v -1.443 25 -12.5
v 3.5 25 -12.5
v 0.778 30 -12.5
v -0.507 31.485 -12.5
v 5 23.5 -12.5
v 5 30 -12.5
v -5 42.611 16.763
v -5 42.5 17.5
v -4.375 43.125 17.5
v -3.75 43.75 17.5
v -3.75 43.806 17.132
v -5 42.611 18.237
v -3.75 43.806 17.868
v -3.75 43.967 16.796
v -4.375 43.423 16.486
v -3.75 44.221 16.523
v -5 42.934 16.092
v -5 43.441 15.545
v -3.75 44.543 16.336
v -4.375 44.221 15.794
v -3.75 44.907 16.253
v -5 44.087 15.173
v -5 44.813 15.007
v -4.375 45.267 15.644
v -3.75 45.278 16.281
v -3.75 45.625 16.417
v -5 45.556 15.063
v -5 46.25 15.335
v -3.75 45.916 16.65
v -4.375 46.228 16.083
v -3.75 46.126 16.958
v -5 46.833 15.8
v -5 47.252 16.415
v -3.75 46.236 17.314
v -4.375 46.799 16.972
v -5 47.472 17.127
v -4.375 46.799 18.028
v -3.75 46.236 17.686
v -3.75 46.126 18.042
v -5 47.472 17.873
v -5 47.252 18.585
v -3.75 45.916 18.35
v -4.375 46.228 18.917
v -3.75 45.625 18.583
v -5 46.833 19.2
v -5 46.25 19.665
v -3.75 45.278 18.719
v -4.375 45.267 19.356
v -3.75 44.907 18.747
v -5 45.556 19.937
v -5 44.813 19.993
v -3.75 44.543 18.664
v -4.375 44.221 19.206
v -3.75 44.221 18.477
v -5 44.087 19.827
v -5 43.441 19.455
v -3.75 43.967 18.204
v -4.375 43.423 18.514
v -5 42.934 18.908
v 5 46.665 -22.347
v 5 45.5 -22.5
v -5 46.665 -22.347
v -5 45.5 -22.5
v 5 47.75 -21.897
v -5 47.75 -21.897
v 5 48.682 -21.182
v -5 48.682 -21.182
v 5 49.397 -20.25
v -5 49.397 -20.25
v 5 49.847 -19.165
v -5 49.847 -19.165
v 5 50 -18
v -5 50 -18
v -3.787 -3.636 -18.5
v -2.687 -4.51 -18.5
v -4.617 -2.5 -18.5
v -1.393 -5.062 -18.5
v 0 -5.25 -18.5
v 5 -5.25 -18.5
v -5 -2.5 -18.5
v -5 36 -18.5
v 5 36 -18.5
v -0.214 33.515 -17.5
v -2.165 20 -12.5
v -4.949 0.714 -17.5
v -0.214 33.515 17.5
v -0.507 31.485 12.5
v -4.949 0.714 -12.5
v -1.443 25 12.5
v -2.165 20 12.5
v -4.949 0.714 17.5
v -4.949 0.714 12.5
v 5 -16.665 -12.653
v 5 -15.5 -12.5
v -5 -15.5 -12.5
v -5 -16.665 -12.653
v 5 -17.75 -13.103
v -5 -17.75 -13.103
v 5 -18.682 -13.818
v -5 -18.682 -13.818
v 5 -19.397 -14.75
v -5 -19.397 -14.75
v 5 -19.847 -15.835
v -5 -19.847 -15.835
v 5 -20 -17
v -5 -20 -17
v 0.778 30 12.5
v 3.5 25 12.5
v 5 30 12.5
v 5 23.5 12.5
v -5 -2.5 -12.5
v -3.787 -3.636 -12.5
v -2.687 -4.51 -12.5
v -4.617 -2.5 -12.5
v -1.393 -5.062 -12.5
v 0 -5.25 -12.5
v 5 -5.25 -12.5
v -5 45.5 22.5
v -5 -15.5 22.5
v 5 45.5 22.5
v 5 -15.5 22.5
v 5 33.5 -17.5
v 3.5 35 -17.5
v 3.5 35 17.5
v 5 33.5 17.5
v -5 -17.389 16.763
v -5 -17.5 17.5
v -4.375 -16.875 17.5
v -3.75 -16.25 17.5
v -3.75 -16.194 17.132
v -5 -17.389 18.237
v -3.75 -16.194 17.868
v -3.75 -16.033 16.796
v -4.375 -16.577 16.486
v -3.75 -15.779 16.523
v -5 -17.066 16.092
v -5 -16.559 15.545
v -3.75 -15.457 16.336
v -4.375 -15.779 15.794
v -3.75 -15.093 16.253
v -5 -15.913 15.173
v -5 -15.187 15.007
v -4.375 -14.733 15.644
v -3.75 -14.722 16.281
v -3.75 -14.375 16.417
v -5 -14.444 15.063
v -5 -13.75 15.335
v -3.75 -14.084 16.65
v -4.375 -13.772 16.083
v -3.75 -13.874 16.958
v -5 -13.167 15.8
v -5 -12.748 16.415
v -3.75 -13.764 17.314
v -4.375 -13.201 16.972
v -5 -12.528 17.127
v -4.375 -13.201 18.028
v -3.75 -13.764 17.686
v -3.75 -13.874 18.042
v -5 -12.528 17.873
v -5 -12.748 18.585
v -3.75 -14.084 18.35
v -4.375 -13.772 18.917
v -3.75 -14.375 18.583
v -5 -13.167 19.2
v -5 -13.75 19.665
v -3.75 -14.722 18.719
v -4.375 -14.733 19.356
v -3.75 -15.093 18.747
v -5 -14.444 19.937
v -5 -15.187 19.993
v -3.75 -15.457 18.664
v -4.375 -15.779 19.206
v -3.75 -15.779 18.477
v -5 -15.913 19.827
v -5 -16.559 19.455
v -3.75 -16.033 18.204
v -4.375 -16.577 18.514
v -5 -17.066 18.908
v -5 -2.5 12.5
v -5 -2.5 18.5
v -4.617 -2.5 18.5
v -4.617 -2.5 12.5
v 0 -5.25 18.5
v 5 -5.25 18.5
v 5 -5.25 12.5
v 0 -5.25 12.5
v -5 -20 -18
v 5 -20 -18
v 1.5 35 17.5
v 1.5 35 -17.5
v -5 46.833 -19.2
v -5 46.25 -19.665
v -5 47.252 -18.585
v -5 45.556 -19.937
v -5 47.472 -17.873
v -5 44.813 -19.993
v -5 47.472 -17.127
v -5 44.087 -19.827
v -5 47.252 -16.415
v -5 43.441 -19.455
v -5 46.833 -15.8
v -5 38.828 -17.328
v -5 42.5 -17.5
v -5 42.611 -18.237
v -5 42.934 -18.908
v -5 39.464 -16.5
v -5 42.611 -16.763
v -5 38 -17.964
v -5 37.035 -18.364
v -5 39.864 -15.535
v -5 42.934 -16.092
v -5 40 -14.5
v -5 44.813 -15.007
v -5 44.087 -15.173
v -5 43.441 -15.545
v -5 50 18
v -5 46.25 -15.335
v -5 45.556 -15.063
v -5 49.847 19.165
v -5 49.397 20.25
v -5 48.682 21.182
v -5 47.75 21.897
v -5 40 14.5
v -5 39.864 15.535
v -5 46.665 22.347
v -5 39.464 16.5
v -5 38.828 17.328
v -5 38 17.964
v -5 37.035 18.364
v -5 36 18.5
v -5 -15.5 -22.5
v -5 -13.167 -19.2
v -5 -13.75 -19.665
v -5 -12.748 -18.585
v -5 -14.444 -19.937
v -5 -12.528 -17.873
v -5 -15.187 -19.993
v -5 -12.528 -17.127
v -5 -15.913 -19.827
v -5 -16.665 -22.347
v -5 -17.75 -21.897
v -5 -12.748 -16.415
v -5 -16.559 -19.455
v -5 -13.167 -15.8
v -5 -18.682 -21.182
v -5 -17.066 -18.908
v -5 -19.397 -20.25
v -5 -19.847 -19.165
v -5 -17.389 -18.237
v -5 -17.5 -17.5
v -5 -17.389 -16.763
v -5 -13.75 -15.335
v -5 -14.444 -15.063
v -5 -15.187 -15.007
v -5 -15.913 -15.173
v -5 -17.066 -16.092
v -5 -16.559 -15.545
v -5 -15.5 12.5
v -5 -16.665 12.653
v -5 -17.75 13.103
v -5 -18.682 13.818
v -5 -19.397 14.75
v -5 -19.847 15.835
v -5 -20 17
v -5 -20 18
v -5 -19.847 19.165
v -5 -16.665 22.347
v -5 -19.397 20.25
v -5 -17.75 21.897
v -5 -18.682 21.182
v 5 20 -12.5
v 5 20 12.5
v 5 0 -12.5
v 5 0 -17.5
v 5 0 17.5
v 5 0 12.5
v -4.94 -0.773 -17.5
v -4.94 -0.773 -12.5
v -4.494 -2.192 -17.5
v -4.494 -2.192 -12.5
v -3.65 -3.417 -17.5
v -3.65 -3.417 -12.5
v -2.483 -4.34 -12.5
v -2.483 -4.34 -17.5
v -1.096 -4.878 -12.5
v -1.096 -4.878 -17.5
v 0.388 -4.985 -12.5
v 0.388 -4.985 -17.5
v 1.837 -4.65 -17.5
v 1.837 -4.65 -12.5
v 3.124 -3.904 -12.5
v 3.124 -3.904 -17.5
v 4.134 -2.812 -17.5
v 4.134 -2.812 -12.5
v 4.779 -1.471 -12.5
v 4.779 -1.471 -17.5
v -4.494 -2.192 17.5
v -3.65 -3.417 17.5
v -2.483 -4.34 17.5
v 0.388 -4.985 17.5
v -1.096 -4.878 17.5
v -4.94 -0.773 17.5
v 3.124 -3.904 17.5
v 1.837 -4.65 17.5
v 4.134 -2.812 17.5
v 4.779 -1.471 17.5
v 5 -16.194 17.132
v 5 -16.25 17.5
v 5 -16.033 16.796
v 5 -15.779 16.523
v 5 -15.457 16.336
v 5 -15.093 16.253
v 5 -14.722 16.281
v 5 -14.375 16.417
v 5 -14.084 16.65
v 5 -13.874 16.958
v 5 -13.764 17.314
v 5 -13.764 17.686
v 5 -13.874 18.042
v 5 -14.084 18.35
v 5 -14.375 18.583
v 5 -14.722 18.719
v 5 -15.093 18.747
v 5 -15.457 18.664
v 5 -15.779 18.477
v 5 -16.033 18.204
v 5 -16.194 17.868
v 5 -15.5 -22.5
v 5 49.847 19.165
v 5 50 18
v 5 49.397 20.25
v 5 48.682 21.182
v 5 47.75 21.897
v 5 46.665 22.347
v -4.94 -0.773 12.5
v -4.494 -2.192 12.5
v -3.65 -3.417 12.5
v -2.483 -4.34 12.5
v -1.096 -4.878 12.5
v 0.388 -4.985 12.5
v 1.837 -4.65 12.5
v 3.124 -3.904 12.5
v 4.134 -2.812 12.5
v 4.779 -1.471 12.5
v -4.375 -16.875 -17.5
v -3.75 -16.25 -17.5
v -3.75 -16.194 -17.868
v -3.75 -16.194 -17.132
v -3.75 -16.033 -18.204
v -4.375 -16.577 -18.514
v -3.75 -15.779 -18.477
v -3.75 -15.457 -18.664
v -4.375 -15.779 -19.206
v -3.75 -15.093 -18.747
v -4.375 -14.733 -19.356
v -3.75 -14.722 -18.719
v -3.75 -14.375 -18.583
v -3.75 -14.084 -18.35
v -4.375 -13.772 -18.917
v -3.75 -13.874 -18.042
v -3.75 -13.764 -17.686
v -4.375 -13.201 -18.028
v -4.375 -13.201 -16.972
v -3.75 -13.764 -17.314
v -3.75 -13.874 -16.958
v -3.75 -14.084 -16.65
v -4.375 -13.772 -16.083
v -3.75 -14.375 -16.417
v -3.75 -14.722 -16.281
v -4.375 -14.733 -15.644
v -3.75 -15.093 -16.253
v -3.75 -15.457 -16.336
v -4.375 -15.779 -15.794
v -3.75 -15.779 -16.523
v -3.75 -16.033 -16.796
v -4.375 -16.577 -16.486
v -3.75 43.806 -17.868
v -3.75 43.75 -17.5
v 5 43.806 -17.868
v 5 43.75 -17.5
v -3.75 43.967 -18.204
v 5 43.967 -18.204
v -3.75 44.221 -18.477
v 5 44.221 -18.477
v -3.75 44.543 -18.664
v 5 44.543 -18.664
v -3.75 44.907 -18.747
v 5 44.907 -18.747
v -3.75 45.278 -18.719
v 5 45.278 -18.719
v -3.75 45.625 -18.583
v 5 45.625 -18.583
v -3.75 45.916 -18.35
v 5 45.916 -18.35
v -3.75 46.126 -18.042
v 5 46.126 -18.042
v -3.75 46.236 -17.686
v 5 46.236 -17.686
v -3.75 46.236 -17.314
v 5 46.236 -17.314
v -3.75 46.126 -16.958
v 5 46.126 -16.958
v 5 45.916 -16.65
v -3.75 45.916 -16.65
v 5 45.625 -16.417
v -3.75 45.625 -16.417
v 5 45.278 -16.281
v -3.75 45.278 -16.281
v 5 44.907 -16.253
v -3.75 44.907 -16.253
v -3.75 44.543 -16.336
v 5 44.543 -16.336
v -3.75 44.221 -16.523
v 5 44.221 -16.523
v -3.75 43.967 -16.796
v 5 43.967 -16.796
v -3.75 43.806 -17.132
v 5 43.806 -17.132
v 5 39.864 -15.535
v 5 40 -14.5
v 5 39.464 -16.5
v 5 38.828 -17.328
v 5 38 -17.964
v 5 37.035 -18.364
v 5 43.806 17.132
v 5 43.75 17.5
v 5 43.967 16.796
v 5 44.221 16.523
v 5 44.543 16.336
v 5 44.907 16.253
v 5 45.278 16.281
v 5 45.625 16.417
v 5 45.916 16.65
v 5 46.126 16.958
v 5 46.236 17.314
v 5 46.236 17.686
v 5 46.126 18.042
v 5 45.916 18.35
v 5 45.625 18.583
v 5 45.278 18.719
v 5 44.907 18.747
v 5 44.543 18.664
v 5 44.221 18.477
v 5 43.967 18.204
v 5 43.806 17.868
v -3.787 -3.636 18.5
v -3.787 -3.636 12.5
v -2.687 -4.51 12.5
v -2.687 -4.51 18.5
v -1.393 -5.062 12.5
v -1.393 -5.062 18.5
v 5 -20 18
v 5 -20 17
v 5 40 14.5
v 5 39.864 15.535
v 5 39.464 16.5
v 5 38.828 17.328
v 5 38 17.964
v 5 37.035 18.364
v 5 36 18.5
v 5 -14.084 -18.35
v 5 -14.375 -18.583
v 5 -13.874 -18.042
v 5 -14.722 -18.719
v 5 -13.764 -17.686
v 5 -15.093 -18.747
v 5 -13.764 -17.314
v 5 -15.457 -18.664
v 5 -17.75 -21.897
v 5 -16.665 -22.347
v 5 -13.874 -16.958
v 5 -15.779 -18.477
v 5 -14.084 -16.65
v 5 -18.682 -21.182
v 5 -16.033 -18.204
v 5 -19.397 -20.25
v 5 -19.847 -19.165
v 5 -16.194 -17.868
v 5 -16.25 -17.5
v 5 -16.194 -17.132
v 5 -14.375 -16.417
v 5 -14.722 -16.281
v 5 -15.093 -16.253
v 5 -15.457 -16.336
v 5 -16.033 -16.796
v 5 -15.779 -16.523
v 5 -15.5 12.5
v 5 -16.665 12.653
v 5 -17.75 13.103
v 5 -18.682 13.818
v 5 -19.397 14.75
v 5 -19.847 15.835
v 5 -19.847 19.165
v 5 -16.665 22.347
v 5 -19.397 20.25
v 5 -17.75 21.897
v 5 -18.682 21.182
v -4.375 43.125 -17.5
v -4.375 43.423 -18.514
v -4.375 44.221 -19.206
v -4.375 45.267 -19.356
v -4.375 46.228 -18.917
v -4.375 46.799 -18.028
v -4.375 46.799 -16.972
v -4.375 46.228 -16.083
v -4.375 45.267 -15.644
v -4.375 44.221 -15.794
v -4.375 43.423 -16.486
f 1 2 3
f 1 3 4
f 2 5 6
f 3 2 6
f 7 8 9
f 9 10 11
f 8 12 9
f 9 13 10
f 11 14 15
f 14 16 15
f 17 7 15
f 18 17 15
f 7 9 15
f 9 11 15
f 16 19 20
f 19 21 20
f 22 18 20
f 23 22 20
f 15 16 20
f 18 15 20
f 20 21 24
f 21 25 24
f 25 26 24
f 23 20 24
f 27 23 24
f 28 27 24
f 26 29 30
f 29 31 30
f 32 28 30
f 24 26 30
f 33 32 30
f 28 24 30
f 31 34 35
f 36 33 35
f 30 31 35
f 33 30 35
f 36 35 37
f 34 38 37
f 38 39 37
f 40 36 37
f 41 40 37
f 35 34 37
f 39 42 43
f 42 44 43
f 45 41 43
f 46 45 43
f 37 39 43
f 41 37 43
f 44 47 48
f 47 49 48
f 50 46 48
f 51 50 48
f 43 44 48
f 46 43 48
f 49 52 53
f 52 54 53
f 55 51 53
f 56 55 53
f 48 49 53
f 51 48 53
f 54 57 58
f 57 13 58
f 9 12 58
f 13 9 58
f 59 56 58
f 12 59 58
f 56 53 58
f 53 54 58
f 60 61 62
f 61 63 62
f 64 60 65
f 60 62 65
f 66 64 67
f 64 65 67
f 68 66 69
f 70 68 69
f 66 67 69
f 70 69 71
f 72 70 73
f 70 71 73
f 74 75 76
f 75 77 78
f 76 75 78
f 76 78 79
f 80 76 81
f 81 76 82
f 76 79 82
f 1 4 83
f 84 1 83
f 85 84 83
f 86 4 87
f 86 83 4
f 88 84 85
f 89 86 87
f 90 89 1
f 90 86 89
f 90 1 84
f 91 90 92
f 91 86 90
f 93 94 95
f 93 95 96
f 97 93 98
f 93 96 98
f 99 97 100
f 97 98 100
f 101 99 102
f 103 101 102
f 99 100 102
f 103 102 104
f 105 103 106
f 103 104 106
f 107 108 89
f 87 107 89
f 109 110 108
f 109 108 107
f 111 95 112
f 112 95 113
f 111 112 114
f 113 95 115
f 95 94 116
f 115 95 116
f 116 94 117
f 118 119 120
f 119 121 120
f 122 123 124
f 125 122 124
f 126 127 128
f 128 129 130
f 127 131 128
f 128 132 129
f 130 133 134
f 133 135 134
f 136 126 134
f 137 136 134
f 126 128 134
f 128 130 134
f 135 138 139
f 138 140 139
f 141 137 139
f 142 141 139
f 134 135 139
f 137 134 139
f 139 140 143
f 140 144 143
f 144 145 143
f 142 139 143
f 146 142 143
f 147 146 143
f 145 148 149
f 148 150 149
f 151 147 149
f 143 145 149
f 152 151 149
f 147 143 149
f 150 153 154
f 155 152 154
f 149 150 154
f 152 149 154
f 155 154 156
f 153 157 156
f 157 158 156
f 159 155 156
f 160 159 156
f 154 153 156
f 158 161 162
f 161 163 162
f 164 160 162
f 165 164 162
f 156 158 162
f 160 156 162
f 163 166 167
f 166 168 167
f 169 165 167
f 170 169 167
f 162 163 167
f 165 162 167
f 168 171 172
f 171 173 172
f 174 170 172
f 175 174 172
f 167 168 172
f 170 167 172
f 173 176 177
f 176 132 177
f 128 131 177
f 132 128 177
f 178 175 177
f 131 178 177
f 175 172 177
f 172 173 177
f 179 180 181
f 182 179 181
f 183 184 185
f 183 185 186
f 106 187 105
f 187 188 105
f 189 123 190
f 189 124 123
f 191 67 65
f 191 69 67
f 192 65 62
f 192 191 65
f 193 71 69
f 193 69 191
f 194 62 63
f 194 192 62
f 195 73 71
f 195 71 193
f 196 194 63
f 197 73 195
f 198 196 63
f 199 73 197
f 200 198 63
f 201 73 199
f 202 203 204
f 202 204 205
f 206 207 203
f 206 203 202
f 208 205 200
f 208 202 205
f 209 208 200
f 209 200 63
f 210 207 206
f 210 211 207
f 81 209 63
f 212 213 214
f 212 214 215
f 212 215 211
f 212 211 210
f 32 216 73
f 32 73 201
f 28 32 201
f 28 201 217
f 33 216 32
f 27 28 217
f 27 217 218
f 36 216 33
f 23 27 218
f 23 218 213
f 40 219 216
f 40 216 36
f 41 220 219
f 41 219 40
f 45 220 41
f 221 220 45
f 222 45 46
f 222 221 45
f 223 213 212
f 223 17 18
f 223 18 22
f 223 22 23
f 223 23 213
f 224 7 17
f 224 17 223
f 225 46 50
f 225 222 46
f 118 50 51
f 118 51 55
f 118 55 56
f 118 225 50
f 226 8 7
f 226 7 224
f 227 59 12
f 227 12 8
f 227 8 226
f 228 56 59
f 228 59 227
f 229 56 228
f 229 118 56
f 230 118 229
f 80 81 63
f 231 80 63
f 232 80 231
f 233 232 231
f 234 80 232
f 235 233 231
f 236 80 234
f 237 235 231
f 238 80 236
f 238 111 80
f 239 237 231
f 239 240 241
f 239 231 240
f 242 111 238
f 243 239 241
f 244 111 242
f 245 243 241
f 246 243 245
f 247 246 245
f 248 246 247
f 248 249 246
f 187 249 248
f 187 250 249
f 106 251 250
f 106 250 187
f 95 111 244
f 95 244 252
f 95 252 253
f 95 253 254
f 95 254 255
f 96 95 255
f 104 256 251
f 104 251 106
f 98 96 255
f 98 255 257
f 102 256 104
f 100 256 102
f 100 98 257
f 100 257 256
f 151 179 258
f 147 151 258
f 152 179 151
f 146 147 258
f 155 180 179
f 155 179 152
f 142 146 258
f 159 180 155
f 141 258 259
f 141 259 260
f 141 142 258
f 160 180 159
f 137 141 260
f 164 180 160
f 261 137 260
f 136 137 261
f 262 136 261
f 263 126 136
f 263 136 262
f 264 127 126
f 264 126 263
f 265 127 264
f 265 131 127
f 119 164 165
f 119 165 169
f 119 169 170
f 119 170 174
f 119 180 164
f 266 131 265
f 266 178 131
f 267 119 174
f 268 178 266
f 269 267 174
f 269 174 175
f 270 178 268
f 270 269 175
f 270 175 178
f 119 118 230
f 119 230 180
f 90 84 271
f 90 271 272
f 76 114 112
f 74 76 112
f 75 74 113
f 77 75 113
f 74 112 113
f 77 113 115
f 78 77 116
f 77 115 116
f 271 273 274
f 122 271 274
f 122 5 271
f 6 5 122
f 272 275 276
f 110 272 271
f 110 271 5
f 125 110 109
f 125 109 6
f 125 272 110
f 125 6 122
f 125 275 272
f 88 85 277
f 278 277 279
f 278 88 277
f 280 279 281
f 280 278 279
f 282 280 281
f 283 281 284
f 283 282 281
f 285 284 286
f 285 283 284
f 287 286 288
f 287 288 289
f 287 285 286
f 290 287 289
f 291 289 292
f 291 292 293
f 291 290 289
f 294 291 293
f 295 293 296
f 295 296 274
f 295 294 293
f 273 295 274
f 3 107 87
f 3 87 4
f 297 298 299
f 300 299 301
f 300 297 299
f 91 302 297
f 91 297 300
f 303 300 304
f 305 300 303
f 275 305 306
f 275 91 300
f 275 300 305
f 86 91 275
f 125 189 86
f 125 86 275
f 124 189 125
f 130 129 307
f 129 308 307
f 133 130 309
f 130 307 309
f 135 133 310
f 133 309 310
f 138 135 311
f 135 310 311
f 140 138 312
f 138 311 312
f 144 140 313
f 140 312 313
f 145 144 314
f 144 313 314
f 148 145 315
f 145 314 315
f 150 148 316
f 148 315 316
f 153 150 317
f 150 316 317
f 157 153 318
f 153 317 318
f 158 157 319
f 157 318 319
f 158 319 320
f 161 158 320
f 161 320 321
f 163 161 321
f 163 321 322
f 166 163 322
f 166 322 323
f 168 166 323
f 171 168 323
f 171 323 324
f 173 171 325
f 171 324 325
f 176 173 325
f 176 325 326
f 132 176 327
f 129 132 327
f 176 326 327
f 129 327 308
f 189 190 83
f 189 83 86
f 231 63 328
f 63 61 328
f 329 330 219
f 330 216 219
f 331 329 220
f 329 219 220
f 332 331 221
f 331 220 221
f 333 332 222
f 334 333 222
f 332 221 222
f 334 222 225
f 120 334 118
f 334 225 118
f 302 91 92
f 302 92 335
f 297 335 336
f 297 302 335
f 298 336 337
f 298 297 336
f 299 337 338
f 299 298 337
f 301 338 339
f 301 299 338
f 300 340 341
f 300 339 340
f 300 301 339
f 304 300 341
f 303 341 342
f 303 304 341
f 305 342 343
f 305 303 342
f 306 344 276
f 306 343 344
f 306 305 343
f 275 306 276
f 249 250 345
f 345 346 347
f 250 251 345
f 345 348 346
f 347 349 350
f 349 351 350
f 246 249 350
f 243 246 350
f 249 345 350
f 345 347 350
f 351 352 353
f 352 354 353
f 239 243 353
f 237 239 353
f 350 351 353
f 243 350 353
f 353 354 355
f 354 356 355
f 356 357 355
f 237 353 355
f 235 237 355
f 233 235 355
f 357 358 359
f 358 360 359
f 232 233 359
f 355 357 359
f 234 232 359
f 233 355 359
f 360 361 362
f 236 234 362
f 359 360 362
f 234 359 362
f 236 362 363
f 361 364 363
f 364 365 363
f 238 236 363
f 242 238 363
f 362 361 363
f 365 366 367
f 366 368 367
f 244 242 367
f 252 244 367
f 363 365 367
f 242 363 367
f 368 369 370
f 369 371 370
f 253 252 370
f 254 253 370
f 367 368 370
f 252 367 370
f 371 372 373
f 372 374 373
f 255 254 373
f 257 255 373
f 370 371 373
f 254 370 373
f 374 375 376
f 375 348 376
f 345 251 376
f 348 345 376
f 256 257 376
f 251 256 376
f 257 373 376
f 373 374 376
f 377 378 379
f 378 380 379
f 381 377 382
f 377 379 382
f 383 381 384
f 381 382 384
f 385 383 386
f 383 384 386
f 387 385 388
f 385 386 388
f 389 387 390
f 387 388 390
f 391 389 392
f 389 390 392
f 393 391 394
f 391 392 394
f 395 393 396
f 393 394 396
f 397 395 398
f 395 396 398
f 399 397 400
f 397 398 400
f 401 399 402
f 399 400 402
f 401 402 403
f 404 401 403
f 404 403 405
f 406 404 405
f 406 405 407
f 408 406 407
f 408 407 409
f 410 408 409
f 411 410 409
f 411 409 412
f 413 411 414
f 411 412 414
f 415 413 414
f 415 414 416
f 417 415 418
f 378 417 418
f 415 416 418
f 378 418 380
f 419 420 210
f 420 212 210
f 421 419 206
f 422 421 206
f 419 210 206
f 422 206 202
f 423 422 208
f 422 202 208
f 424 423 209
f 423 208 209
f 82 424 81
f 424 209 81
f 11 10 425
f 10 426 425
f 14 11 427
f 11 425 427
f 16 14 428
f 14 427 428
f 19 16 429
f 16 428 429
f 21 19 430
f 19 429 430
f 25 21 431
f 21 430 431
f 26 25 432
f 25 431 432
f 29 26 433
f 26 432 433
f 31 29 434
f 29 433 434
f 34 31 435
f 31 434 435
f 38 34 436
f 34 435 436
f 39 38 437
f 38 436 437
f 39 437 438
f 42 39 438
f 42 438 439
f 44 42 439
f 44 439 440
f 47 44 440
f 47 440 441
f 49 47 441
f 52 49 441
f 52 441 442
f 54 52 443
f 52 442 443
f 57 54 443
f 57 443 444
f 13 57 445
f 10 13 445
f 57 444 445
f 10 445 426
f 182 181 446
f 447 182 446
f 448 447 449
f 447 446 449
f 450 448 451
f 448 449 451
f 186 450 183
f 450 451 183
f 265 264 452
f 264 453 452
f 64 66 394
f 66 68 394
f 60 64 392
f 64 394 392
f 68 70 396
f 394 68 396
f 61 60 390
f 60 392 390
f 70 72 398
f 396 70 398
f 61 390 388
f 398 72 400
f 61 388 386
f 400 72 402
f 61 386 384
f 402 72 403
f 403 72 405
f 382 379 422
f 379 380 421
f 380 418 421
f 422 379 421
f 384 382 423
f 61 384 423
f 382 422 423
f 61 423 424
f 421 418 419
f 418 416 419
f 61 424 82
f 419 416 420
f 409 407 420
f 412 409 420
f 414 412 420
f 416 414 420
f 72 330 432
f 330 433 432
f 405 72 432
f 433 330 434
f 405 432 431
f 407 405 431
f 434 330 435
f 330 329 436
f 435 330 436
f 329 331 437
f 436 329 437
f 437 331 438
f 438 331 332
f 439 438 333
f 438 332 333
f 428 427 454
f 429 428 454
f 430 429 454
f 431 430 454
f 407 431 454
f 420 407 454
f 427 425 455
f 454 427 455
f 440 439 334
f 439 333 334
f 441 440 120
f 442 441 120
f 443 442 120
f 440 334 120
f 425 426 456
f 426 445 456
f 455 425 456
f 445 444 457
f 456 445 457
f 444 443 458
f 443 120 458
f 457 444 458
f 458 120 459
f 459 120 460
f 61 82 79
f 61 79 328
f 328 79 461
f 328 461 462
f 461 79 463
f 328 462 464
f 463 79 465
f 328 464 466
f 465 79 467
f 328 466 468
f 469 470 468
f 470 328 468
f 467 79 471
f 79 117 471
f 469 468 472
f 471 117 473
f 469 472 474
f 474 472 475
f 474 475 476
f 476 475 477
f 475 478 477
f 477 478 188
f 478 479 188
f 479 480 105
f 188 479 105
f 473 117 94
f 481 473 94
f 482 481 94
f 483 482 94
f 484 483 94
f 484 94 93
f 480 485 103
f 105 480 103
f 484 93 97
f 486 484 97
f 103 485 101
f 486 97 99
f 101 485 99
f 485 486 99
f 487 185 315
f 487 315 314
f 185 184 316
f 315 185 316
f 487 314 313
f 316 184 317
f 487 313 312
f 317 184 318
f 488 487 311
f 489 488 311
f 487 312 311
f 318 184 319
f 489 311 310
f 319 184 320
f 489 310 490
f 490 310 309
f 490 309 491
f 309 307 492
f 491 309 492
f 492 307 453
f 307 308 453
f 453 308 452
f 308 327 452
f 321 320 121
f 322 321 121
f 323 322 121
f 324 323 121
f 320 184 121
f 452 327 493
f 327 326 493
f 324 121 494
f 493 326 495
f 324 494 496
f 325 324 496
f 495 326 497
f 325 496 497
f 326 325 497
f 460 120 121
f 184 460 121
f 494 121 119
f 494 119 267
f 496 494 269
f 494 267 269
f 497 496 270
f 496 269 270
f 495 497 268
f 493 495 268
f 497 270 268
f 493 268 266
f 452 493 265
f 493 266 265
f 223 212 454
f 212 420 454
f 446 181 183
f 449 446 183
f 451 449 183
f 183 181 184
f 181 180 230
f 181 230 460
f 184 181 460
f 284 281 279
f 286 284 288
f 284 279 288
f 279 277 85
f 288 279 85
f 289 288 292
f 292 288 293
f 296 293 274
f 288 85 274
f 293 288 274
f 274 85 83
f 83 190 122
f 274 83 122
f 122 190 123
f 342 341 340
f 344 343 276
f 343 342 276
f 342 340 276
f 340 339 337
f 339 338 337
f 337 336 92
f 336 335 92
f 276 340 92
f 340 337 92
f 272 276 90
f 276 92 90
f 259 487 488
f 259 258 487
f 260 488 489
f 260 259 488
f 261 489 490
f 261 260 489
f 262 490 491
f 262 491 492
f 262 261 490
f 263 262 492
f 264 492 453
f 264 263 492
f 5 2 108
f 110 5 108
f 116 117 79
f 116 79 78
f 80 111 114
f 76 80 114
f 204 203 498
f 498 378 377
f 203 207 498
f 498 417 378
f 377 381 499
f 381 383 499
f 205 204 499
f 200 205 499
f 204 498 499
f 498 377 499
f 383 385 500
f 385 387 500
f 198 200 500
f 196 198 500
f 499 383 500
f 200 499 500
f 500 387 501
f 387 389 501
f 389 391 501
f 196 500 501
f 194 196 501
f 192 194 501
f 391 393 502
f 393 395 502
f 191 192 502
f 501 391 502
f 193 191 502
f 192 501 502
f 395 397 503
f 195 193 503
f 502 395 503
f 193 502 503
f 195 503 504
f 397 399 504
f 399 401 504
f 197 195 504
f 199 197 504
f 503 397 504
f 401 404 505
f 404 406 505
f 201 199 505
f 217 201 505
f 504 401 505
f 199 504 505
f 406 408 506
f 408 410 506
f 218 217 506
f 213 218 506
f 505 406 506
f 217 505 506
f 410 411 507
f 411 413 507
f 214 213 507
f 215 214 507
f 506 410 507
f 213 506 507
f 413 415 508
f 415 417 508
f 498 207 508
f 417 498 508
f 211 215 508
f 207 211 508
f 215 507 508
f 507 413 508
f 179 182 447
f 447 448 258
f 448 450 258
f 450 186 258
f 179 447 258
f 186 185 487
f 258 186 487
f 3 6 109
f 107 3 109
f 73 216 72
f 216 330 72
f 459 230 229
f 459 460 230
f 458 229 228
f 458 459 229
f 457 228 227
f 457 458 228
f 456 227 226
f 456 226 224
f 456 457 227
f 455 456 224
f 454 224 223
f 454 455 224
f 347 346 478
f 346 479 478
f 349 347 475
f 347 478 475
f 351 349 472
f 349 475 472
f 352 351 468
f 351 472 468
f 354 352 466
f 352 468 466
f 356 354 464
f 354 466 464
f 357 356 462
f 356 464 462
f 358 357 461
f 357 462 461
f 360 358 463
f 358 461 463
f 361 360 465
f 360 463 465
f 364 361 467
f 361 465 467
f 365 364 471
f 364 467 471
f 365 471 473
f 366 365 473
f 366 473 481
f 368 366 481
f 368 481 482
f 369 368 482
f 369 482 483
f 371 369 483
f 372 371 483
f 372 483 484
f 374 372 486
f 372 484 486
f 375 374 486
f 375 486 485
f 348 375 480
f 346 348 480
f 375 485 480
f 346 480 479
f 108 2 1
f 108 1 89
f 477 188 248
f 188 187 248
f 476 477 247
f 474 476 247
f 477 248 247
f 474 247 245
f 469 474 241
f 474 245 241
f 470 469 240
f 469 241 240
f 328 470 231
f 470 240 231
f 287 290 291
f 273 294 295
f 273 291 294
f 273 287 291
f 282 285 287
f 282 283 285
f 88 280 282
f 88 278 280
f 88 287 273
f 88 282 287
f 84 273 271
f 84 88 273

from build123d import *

# Parameters (mm, degrees)
PAD_DEPTH        = 17.5
SKETCH001_W      = 40
SKETCH001_H      = 25
SKETCH001_W_2    = 5
POCKET_DEPTH     = 10
CHAMFER_SIZE     = 1.5
PAD001_DEPTH     = 5
POCKET001_DEPTH  = 18.5
HOLE_D           = 2.5
HOLE_DEPTH       = 25
HOLE_CSINK_D     = 5
HOLE_CSINK_ANGLE = 90
FILLET_R         = 4.5
FILLET001_R      = 4


with BuildPart() as body:
    # Sketch → Pad (new body, symmetric)
    with BuildSketch(Plane.XY):
        with BuildLine():
            Line((5, 0), (5, 35))
            Line((5, 35), (0, 35))
            Line((0, 35), (-4.9487165931, 0.7142857143))
            ThreePointArc((-4.9487165931, 0.7142857143), (-0.3580621697, -4.9871626686), (5, 0))
        make_face()
    extrude(amount=PAD_DEPTH, both=True)

    # Sketch001 (on Face1 of Pad) → Pocket (cut, symmetric)
    with BuildSketch(Plane.YZ.offset(5)):
        Rectangle(SKETCH001_W, SKETCH001_H)
        with Locations((27.5, 0)):
            Rectangle(SKETCH001_W_2, SKETCH001_H)
    extrude(amount=POCKET_DEPTH, both=True, mode=Mode.SUBTRACT)

    # Chamfer
    chamfer_edges = [body.edges().sort_by_distance(p)[0] for p in [
        (5, 25, 0),
        (5, 35, 0),
        (0, 35, 0),
        (-0.721688, 30, 0),
    ]]
    chamfer(chamfer_edges, length=CHAMFER_SIZE)


with BuildPart() as body001:
    # Sketch002 → Pad001 (new body, symmetric)
    with BuildSketch(Plane.YZ):
        Polygon((0, 12.5), (-20, 12.5), (-20, 22.5), (50, 22.5), (50, -22.5), (-20, -22.5), (-20, -12.5), (0, -12.5), (0, -18.5), (40, -18.5), (40, 18.5), (0, 18.5), align=None)
    extrude(amount=PAD001_DEPTH, both=True)

    # Sketch003 → Pocket001 (cut, symmetric)
    with BuildSketch(Plane.XY):
        with BuildLine():
            ThreePointArc((-4.6165463282, -2.5), (-2.6867731575, -4.5104046382), (0, -5.25))
            Line((5, -5.25), (0, -5.25))
            Line((5, -5.25), (5, 5))
            Line((5, 5), (-5, 5))
            Line((-5, 5), (-5, -2.5))
            Line((-5, -2.5), (-4.6165463282, -2.5))
        make_face()
    extrude(amount=POCKET001_DEPTH, both=True, mode=Mode.SUBTRACT)

    # Hole
    with Locations(Plane(origin=(-5, 0, 0), x_dir=(0, 1, 0), z_dir=(-1, 0, 0))):
        with Locations((45, 17.5), (45, -17.5), (-15, 17.5), (-15, -17.5)):
            CounterSinkHole(HOLE_D / 2, HOLE_CSINK_D / 2, depth=HOLE_DEPTH, counter_sink_angle=HOLE_CSINK_ANGLE)

    # Fillet
    fillet_edges = [body001.edges().sort_by_distance(p)[0] for p in [
        (0, -20, -22.5),
        (0, -20, -12.5),
        (0, -20, 12.5),
        (0, -20, 22.5),
        (0, 50, 22.5),
        (0, 50, -22.5),
    ]]
    fillet(fillet_edges, radius=FILLET_R)

    # Fillet001
    fillet001_edges = [body001.edges().sort_by_distance(p)[0] for p in [
        (0, 40, -18.5),
        (0, 40, 18.5),
    ]]
    fillet(fillet001_edges, radius=FILLET001_R)


solid = Compound([body.part, body001.part])
